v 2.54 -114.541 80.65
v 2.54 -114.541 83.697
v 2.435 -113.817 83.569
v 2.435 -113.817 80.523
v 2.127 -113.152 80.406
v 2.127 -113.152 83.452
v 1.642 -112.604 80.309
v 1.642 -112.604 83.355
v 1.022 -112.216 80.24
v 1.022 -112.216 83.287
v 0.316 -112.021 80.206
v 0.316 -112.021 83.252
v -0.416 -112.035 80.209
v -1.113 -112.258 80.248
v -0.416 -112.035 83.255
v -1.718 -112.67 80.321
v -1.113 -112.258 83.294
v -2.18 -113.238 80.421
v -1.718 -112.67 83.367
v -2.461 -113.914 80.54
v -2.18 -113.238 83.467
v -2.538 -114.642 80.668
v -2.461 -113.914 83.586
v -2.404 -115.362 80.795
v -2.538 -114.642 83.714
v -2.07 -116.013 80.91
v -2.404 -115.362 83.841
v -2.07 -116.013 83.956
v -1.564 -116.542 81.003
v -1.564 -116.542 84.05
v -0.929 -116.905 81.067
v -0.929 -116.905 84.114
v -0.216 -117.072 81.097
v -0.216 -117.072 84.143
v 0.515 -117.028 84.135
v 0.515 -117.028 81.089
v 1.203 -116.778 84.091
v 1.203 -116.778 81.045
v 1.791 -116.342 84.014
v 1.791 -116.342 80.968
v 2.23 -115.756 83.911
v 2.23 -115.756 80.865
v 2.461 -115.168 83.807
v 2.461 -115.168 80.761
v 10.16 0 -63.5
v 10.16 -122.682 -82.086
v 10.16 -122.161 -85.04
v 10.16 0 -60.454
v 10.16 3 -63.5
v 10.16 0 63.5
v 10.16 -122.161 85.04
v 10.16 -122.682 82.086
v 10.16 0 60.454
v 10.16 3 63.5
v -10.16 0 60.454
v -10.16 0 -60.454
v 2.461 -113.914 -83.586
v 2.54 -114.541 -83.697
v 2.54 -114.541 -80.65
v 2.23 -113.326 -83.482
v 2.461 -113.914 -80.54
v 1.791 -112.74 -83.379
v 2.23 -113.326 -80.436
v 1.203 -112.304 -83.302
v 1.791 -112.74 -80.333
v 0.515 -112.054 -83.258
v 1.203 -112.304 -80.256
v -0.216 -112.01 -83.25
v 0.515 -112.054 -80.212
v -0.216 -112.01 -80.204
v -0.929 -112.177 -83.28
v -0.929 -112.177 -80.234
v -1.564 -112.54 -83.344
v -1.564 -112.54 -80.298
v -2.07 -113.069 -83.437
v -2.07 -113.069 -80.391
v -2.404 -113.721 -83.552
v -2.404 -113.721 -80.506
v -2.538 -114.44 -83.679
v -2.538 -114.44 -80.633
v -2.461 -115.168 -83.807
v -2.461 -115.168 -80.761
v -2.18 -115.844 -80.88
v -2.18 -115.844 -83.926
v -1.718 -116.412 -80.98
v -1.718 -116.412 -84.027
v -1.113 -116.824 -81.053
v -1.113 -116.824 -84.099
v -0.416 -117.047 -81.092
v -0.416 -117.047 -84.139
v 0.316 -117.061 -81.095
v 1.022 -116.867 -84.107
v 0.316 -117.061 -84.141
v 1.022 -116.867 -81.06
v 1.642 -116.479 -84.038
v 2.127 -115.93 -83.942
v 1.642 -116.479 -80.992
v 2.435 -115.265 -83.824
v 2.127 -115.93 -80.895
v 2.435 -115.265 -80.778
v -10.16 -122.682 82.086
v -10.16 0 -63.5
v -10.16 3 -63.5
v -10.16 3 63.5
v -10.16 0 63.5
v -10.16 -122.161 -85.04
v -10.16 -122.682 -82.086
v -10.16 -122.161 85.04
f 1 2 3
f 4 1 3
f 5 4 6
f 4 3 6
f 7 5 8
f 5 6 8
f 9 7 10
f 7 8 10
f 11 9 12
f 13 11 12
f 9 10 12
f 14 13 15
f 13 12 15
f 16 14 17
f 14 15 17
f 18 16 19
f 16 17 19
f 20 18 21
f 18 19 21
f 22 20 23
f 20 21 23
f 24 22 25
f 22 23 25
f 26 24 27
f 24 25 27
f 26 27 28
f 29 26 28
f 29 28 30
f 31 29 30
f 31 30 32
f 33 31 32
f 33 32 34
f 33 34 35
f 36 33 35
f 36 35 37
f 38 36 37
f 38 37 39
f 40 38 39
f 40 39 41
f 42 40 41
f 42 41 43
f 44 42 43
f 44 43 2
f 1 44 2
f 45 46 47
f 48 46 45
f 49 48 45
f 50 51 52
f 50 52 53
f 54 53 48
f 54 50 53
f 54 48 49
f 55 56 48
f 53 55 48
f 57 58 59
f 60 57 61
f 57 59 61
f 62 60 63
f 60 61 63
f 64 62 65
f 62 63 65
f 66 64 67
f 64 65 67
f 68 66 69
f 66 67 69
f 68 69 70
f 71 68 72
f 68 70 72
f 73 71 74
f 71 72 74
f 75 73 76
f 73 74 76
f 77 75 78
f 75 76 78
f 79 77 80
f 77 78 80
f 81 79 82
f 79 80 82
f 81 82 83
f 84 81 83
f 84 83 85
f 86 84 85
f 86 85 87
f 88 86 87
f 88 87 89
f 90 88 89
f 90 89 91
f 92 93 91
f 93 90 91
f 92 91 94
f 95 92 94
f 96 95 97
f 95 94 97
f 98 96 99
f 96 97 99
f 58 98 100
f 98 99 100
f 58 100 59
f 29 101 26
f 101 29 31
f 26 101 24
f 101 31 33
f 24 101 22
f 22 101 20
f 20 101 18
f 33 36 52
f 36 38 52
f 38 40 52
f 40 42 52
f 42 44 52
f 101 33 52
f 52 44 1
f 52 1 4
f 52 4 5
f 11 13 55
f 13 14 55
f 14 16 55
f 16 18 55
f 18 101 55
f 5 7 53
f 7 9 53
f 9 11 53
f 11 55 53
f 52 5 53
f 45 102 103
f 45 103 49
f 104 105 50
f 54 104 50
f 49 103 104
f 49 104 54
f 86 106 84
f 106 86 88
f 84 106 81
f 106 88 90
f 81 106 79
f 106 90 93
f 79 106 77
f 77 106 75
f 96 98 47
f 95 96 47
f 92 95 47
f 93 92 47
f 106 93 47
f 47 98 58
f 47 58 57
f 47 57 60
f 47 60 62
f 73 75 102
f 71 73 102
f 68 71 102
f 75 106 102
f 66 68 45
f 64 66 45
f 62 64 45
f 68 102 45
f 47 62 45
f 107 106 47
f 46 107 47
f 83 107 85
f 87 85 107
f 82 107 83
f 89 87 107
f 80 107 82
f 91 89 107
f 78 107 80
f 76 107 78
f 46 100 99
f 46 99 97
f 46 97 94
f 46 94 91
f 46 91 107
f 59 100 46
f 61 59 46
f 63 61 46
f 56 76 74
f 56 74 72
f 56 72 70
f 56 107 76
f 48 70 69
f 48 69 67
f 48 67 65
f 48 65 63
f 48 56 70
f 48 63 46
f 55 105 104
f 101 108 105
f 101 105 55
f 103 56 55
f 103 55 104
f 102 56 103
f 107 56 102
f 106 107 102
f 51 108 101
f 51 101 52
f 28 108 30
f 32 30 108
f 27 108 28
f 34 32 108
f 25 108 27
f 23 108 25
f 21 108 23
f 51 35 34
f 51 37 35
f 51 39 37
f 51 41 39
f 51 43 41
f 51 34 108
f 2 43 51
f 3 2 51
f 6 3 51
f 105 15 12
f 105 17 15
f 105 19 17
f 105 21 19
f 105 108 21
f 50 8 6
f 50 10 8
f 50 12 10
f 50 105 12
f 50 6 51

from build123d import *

# Parameters (mm, degrees)
SKETCH2_W           = 20.32
SKETCH2_H           = 127
BOSS_EXTRUDE1_DEPTH = 2.999994
BOSS_EXTRUDE2_DEPTH = 2.999994
SKETCH6_R           = 2.54
CUT_EXTRUDE2_DEPTH  = 171.130289375


with BuildPart() as part:
    # Sketch2 → Boss-Extrude1 (new body)
    with BuildSketch(Plane(origin=(0, 0, 0), x_dir=(1, 0, 0), z_dir=(0, 1, 0))):
        Rectangle(SKETCH2_W, SKETCH2_H)
    extrude(amount=BOSS_EXTRUDE1_DEPTH)

    # Sketch4 → Boss-Extrude2 (add)
    with BuildSketch(Plane(origin=(0, 10.859139551, 61.58524071), x_dir=(1, 0, 0), z_dir=(0, 0.173648178, 0.984807753))):
        Polygon((10.16, -8.072241932), (-10.16, -8.072241932), (-10.16, -135.072241932), (0, -135.072241932), (10.16, -135.072241932), align=None)
    boss_extrude2 = extrude(amount=-BOSS_EXTRUDE2_DEPTH)

    # Mirror1: Boss-Extrude2 across plane
    add(boss_extrude2.mirror(Plane.XY))

    # Sketch6 → Cut-Extrude2 (cut, through all)
    with BuildSketch(Plane.XY.offset(85.09)):
        with Locations((0, -114.54105152)):
            Circle(SKETCH6_R)
    extrude(amount=-CUT_EXTRUDE2_DEPTH, mode=Mode.SUBTRACT)


solid = part.part
